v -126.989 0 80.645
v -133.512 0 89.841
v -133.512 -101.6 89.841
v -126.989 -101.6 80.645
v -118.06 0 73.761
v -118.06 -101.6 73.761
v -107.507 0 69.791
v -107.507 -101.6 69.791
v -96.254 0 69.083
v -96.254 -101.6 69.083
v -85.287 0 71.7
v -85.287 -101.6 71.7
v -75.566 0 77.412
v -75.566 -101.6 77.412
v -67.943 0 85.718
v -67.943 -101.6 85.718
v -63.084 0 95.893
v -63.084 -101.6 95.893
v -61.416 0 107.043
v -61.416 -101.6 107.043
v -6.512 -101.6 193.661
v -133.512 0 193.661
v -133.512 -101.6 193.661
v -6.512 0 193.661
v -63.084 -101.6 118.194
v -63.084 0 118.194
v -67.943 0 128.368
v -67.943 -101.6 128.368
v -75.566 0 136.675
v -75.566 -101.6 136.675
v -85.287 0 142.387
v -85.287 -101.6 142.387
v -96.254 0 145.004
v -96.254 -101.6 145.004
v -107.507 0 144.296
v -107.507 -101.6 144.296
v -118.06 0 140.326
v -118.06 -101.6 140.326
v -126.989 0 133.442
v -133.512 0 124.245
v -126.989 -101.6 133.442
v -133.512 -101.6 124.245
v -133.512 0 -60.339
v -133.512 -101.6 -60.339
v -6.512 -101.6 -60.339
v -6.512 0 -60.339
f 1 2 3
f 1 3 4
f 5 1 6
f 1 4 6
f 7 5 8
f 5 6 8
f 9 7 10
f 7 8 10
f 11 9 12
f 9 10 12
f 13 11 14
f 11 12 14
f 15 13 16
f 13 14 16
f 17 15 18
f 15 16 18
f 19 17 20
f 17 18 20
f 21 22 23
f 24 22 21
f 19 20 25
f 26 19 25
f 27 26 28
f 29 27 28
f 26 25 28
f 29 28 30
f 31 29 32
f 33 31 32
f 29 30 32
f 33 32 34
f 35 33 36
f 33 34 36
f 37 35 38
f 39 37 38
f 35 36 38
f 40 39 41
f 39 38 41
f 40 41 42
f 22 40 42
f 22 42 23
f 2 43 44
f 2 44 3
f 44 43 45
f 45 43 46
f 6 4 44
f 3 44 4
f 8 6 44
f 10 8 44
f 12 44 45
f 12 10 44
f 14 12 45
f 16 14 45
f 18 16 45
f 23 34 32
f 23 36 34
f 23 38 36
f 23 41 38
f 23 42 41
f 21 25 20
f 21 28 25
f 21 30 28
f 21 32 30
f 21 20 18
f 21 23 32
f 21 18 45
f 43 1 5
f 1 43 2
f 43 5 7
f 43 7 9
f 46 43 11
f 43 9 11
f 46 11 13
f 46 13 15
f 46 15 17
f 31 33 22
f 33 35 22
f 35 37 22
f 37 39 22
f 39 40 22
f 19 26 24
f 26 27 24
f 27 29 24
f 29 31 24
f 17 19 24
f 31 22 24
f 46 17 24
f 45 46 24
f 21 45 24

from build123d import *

# Parameters (mm, degrees)
F0_W     = 127
F0_H     = 254
F1_DEPTH = 101.6
F3_DEPTH = 101.601


with BuildPart() as f1:
    # F0 (on Front) → F1 (new body)
    with BuildSketch(Plane.XZ):
        with Locations((-70.0115717482, 66.6608795685)):
            Rectangle(F0_W, F0_H)
    extrude(amount=F1_DEPTH)

    # F2 (on face) → F3 (cut, through all)
    with BuildSketch(Plane.XZ.offset(101.6)):
        with BuildLine():
            ThreePointArc((-133.5115717482, 89.8414792443), (-90.6735324782, 69.9836491161), (-61.4159074664, 107.0433631539))
            ThreePointArc((-61.4159074664, 107.0433631539), (-90.6735324782, 144.1030771918), (-133.5115717482, 124.2452470636))
            Line((-133.5115717482, 124.2452470636), (-133.5115717482, 89.8414792443))
        make_face()
    extrude(amount=-F3_DEPTH, mode=Mode.SUBTRACT)


solid = f1.part
